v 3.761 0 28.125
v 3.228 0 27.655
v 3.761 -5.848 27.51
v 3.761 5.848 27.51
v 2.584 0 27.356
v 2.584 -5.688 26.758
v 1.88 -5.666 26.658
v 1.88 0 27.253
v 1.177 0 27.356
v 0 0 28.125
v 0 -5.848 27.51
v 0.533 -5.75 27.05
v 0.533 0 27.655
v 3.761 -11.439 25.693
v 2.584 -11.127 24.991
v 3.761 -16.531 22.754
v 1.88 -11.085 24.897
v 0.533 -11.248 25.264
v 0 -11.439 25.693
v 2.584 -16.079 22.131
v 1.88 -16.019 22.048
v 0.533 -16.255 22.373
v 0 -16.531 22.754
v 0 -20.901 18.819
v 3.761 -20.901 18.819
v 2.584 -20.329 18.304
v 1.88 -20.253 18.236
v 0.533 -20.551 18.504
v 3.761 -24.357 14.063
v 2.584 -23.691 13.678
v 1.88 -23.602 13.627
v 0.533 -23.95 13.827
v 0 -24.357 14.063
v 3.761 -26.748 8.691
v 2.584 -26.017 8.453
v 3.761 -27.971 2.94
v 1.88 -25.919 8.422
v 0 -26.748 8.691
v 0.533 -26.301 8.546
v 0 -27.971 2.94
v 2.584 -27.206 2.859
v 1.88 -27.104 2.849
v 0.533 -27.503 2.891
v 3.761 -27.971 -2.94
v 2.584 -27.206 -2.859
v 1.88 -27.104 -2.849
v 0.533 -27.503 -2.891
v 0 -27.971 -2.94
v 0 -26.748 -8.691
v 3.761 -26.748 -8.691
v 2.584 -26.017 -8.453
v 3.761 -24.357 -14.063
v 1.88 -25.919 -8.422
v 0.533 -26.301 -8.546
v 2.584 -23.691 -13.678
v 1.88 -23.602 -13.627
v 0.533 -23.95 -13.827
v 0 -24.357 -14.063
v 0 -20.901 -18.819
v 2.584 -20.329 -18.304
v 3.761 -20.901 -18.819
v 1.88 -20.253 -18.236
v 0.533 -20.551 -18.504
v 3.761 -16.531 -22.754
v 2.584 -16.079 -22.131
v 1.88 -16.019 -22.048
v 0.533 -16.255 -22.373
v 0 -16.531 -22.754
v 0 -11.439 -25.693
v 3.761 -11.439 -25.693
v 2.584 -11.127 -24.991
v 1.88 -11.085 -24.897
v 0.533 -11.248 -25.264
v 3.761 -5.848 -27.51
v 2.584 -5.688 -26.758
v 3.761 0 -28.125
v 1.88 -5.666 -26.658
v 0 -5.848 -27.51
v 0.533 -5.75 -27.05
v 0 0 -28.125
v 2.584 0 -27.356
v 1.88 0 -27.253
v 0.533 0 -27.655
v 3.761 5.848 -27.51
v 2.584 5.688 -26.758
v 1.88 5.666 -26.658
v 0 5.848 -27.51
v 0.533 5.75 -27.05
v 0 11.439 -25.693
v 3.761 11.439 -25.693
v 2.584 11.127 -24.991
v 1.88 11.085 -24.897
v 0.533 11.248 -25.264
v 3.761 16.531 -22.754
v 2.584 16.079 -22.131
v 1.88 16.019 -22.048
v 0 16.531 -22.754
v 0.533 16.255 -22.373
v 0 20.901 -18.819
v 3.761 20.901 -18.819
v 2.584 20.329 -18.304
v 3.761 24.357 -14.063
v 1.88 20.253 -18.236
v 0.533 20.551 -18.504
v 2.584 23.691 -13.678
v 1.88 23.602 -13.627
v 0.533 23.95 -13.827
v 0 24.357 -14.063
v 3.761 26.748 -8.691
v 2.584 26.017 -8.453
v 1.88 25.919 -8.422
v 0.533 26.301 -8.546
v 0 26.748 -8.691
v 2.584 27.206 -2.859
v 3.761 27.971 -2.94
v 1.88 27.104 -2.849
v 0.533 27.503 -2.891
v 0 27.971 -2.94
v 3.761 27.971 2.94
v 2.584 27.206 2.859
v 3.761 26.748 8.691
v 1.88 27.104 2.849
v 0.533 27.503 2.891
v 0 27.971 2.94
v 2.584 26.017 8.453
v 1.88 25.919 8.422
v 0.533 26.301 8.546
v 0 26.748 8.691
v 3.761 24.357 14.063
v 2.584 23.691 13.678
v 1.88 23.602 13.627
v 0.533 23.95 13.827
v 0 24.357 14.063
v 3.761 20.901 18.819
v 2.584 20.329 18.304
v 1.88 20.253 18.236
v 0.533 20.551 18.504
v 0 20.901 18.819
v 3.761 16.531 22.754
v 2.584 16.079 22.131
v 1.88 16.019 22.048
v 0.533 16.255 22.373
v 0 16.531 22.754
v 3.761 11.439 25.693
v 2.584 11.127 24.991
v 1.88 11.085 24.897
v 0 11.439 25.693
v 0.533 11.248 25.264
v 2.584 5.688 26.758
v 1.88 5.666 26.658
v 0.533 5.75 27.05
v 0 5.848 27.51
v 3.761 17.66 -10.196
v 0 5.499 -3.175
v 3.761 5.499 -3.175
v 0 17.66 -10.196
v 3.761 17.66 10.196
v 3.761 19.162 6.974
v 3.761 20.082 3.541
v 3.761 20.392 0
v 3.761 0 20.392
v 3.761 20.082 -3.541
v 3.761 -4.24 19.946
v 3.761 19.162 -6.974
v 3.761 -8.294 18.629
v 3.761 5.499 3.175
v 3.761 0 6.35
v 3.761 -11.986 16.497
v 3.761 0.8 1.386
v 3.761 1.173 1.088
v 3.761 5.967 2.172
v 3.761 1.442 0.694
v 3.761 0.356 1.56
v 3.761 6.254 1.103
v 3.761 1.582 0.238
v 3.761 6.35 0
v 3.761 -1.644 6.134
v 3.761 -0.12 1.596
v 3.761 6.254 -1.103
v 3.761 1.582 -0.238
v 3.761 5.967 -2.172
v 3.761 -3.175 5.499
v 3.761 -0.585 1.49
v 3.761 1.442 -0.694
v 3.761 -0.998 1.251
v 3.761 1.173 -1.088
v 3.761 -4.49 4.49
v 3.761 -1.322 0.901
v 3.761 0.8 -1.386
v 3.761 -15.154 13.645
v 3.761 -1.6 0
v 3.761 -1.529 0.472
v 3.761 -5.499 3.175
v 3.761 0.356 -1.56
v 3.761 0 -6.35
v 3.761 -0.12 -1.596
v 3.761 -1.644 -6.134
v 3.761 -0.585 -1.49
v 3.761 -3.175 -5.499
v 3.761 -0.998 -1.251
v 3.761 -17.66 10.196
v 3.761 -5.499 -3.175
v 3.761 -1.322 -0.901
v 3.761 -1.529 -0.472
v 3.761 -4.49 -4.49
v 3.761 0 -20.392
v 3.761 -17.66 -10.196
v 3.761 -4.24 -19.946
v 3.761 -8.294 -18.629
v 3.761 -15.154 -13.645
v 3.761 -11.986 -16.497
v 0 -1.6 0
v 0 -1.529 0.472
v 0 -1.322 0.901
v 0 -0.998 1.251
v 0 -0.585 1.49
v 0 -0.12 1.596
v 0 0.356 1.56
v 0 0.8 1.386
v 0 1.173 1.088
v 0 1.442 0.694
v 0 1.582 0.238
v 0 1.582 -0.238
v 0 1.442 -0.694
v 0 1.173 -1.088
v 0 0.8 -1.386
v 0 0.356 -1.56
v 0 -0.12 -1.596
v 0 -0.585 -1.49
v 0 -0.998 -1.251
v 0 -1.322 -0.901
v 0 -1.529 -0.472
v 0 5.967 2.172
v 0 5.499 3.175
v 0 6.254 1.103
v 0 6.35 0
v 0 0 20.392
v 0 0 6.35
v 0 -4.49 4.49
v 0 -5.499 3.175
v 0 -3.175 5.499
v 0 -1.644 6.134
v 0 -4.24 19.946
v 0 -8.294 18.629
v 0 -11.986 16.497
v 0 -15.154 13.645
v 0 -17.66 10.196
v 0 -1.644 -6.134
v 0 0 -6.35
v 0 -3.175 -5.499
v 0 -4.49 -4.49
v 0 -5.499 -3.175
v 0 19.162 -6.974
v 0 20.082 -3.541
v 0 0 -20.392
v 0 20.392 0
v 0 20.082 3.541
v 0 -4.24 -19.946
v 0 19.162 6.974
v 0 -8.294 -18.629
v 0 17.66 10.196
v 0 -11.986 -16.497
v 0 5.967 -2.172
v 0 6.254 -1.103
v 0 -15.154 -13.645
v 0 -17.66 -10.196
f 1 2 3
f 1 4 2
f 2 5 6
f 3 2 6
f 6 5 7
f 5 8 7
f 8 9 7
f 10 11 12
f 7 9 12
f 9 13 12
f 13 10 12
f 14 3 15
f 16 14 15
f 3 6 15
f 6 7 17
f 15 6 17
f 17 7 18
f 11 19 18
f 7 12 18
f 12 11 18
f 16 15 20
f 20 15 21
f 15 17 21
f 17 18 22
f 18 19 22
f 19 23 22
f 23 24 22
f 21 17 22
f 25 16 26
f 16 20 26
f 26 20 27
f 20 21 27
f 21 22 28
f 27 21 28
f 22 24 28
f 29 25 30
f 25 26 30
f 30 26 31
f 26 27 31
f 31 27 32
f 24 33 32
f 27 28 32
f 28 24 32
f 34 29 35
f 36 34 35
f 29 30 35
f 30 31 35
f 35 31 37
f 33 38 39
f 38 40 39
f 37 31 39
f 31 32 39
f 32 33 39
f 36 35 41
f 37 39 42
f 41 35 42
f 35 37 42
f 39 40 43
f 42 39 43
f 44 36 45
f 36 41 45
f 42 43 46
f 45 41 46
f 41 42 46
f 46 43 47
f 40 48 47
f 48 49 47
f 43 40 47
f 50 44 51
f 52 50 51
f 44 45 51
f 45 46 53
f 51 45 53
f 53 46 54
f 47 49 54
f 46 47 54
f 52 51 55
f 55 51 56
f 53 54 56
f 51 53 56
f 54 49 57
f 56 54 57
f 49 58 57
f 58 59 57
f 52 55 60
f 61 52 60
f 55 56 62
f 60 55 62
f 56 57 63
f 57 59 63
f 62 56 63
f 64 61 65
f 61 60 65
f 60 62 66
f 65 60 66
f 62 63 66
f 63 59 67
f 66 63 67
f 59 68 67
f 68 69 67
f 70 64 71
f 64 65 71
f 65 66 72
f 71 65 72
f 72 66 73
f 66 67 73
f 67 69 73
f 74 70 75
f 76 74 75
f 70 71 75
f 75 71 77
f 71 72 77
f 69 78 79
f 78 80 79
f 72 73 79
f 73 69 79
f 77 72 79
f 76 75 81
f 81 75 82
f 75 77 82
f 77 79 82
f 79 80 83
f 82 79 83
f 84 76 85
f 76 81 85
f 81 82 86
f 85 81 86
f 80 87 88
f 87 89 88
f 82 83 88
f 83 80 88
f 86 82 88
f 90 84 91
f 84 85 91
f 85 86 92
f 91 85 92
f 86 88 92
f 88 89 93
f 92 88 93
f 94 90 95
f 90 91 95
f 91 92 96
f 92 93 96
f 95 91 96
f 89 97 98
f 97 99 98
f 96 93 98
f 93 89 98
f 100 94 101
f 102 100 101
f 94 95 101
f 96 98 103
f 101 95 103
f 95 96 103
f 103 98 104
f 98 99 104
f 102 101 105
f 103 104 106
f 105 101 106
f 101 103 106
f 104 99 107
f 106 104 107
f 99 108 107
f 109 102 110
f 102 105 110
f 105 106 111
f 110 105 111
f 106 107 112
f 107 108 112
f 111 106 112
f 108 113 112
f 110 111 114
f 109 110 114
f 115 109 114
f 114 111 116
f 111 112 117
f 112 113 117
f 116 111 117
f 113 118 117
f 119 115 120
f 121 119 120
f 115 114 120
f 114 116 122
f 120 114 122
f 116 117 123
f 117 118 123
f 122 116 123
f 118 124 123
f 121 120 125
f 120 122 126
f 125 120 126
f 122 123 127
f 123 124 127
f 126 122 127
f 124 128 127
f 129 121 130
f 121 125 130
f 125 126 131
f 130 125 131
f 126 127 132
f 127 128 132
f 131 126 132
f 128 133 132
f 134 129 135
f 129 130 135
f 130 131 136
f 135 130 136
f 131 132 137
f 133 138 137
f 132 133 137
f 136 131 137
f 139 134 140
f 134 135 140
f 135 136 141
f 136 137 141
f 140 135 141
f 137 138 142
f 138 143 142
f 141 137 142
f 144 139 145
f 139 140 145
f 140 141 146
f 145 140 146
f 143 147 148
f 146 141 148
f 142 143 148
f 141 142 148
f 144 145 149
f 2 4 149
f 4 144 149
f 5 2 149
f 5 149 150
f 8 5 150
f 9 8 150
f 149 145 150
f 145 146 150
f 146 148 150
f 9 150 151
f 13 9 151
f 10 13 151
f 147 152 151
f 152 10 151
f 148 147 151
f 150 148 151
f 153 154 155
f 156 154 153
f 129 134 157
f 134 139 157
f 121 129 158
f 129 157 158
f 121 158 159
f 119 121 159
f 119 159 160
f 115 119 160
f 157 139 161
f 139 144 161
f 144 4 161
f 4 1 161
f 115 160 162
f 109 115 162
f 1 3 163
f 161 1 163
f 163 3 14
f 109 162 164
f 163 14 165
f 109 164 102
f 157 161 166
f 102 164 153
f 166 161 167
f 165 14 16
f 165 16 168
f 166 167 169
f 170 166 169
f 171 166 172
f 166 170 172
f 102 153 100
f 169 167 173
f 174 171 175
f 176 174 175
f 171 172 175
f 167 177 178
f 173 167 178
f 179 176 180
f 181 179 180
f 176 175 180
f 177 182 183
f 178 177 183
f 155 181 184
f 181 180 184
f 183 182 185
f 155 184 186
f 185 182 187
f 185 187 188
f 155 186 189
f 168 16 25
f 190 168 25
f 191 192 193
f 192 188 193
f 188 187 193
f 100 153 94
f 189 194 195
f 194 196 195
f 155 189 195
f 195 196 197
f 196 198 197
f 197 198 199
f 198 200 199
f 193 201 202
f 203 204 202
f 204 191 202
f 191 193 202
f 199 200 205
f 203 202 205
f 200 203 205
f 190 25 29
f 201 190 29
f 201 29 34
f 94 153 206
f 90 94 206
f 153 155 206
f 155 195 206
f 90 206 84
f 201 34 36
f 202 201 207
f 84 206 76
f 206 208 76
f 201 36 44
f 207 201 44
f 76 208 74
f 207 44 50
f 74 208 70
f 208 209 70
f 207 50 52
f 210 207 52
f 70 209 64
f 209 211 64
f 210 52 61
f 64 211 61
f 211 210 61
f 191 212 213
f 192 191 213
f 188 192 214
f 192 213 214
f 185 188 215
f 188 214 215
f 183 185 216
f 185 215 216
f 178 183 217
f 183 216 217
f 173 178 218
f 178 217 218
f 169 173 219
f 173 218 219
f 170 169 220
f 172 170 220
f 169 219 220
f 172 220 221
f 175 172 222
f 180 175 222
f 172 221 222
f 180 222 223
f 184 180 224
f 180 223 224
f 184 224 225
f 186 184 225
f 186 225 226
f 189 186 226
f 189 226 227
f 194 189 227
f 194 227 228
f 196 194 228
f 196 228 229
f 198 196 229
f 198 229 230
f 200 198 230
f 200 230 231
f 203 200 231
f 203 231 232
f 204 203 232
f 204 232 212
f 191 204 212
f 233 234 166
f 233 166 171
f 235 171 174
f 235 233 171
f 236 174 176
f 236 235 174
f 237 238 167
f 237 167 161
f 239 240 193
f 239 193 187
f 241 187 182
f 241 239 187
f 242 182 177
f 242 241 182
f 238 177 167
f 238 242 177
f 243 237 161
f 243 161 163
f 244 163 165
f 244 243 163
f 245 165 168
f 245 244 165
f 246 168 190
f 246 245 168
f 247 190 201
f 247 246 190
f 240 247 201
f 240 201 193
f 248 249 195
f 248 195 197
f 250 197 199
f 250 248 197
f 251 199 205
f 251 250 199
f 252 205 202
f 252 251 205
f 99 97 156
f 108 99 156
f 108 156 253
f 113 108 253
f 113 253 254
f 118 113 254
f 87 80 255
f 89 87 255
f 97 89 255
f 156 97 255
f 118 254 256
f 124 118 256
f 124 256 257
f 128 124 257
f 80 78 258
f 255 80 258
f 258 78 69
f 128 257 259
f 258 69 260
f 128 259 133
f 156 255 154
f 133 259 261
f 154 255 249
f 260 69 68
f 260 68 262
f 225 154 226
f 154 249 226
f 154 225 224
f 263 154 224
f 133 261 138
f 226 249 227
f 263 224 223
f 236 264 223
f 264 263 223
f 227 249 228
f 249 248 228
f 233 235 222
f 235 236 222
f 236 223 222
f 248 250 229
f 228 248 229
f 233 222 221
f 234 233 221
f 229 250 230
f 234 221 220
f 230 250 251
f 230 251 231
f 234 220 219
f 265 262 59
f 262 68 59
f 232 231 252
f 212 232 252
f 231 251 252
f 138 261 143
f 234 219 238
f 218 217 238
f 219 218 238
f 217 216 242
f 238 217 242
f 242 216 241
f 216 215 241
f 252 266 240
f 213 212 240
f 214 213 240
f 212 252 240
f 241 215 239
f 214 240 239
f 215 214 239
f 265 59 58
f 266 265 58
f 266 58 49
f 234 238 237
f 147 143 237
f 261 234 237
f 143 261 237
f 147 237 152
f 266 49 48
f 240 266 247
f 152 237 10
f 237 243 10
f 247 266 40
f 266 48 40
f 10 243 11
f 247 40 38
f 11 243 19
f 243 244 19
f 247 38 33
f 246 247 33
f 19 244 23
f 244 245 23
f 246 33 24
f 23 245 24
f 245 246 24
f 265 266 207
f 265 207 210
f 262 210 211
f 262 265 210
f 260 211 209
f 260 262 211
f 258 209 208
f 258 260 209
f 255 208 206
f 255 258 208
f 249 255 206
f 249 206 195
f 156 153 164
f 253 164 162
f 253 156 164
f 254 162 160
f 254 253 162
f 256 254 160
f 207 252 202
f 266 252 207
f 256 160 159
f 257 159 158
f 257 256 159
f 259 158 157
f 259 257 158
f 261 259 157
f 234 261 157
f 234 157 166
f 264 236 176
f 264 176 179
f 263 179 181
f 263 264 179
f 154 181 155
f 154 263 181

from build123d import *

# Parameters (mm, degrees)
F3_DEPTH      = 82
F3_DEPTH_BACK = 25.4
F4_R          = 1.6002
F5_DEPTH      = 3.7619021022


# Not quite as in the source:
# - an extrude ends at something that could not be found from the text; its depth is read off the source's solid


with BuildPart() as f1:
    # F0 (on Front) → F1 (revolve)
    with BuildSketch(Plane.XZ):
        with BuildLine():
            Line((0, 28.125), (0, 0))
            Line((0, 0), (3.7609021022, 0))
            Line((3.7609021022, 0), (3.7609021022, 28.125))
            ThreePointArc((3.7609021022, 28.125), (1.8804510511, 27.2531215698), (0, 28.125))
        make_face()
    revolve(axis=Axis((1.8804510511, 0, 0), (1, 0, 0)))

    # F2 (on Right) → F3 (cut, two sides)
    with BuildSketch(Plane.YZ) as f3_sk:
        with BuildLine():
            ThreePointArc((-5.499261314, 3.175), (-3.175, 5.499261314), (0, 6.35))
            Line((0, 6.35), (0, 20.391961195))
            ThreePointArc((0, 20.391961195), (-10.1959805975, 17.6599564279), (-17.6599564279, 10.1959805975))
            Line((-17.6599564279, 10.1959805975), (-5.499261314, 3.175))
        make_face()
        with BuildLine():
            Line((0, -20.391961195), (0, -6.35))
            ThreePointArc((0, -6.35), (-3.175, -5.499261314), (-5.499261314, -3.175))
            Line((-5.499261314, -3.175), (-17.6599564279, -10.1959805975))
            ThreePointArc((-17.6599564279, -10.1959805975), (-10.1959805975, -17.6599564279), (0, -20.391961195))
        make_face()
        with BuildLine():
            ThreePointArc((5.499261314, 3.175), (6.1336289969, 1.6435009364), (6.35, 0))
            ThreePointArc((6.35, 0), (6.1336289969, -1.6435009364), (5.499261314, -3.175))
            Line((5.499261314, -3.175), (17.6599564279, -10.1959805975))
            ThreePointArc((17.6599564279, -10.1959805975), (19.6971219669, -5.2778279243), (20.391961195, 0))
            ThreePointArc((20.391961195, 0), (19.6971219669, 5.2778279243), (17.6599564279, 10.1959805975))
            Line((17.6599564279, 10.1959805975), (5.499261314, 3.175))
        make_face()
    extrude(amount=-F3_DEPTH, mode=Mode.SUBTRACT)
    extrude(f3_sk.sketch, amount=F3_DEPTH_BACK, mode=Mode.SUBTRACT)

    # F4 (on face) → F5 (cut, through all)
    with BuildSketch(Plane(origin=(0, 0, 0), x_dir=(0, -1, 0), z_dir=(-1, 0, 0))):
        Circle(F4_R)
    extrude(amount=-F5_DEPTH, mode=Mode.SUBTRACT)


solid = f1.part
